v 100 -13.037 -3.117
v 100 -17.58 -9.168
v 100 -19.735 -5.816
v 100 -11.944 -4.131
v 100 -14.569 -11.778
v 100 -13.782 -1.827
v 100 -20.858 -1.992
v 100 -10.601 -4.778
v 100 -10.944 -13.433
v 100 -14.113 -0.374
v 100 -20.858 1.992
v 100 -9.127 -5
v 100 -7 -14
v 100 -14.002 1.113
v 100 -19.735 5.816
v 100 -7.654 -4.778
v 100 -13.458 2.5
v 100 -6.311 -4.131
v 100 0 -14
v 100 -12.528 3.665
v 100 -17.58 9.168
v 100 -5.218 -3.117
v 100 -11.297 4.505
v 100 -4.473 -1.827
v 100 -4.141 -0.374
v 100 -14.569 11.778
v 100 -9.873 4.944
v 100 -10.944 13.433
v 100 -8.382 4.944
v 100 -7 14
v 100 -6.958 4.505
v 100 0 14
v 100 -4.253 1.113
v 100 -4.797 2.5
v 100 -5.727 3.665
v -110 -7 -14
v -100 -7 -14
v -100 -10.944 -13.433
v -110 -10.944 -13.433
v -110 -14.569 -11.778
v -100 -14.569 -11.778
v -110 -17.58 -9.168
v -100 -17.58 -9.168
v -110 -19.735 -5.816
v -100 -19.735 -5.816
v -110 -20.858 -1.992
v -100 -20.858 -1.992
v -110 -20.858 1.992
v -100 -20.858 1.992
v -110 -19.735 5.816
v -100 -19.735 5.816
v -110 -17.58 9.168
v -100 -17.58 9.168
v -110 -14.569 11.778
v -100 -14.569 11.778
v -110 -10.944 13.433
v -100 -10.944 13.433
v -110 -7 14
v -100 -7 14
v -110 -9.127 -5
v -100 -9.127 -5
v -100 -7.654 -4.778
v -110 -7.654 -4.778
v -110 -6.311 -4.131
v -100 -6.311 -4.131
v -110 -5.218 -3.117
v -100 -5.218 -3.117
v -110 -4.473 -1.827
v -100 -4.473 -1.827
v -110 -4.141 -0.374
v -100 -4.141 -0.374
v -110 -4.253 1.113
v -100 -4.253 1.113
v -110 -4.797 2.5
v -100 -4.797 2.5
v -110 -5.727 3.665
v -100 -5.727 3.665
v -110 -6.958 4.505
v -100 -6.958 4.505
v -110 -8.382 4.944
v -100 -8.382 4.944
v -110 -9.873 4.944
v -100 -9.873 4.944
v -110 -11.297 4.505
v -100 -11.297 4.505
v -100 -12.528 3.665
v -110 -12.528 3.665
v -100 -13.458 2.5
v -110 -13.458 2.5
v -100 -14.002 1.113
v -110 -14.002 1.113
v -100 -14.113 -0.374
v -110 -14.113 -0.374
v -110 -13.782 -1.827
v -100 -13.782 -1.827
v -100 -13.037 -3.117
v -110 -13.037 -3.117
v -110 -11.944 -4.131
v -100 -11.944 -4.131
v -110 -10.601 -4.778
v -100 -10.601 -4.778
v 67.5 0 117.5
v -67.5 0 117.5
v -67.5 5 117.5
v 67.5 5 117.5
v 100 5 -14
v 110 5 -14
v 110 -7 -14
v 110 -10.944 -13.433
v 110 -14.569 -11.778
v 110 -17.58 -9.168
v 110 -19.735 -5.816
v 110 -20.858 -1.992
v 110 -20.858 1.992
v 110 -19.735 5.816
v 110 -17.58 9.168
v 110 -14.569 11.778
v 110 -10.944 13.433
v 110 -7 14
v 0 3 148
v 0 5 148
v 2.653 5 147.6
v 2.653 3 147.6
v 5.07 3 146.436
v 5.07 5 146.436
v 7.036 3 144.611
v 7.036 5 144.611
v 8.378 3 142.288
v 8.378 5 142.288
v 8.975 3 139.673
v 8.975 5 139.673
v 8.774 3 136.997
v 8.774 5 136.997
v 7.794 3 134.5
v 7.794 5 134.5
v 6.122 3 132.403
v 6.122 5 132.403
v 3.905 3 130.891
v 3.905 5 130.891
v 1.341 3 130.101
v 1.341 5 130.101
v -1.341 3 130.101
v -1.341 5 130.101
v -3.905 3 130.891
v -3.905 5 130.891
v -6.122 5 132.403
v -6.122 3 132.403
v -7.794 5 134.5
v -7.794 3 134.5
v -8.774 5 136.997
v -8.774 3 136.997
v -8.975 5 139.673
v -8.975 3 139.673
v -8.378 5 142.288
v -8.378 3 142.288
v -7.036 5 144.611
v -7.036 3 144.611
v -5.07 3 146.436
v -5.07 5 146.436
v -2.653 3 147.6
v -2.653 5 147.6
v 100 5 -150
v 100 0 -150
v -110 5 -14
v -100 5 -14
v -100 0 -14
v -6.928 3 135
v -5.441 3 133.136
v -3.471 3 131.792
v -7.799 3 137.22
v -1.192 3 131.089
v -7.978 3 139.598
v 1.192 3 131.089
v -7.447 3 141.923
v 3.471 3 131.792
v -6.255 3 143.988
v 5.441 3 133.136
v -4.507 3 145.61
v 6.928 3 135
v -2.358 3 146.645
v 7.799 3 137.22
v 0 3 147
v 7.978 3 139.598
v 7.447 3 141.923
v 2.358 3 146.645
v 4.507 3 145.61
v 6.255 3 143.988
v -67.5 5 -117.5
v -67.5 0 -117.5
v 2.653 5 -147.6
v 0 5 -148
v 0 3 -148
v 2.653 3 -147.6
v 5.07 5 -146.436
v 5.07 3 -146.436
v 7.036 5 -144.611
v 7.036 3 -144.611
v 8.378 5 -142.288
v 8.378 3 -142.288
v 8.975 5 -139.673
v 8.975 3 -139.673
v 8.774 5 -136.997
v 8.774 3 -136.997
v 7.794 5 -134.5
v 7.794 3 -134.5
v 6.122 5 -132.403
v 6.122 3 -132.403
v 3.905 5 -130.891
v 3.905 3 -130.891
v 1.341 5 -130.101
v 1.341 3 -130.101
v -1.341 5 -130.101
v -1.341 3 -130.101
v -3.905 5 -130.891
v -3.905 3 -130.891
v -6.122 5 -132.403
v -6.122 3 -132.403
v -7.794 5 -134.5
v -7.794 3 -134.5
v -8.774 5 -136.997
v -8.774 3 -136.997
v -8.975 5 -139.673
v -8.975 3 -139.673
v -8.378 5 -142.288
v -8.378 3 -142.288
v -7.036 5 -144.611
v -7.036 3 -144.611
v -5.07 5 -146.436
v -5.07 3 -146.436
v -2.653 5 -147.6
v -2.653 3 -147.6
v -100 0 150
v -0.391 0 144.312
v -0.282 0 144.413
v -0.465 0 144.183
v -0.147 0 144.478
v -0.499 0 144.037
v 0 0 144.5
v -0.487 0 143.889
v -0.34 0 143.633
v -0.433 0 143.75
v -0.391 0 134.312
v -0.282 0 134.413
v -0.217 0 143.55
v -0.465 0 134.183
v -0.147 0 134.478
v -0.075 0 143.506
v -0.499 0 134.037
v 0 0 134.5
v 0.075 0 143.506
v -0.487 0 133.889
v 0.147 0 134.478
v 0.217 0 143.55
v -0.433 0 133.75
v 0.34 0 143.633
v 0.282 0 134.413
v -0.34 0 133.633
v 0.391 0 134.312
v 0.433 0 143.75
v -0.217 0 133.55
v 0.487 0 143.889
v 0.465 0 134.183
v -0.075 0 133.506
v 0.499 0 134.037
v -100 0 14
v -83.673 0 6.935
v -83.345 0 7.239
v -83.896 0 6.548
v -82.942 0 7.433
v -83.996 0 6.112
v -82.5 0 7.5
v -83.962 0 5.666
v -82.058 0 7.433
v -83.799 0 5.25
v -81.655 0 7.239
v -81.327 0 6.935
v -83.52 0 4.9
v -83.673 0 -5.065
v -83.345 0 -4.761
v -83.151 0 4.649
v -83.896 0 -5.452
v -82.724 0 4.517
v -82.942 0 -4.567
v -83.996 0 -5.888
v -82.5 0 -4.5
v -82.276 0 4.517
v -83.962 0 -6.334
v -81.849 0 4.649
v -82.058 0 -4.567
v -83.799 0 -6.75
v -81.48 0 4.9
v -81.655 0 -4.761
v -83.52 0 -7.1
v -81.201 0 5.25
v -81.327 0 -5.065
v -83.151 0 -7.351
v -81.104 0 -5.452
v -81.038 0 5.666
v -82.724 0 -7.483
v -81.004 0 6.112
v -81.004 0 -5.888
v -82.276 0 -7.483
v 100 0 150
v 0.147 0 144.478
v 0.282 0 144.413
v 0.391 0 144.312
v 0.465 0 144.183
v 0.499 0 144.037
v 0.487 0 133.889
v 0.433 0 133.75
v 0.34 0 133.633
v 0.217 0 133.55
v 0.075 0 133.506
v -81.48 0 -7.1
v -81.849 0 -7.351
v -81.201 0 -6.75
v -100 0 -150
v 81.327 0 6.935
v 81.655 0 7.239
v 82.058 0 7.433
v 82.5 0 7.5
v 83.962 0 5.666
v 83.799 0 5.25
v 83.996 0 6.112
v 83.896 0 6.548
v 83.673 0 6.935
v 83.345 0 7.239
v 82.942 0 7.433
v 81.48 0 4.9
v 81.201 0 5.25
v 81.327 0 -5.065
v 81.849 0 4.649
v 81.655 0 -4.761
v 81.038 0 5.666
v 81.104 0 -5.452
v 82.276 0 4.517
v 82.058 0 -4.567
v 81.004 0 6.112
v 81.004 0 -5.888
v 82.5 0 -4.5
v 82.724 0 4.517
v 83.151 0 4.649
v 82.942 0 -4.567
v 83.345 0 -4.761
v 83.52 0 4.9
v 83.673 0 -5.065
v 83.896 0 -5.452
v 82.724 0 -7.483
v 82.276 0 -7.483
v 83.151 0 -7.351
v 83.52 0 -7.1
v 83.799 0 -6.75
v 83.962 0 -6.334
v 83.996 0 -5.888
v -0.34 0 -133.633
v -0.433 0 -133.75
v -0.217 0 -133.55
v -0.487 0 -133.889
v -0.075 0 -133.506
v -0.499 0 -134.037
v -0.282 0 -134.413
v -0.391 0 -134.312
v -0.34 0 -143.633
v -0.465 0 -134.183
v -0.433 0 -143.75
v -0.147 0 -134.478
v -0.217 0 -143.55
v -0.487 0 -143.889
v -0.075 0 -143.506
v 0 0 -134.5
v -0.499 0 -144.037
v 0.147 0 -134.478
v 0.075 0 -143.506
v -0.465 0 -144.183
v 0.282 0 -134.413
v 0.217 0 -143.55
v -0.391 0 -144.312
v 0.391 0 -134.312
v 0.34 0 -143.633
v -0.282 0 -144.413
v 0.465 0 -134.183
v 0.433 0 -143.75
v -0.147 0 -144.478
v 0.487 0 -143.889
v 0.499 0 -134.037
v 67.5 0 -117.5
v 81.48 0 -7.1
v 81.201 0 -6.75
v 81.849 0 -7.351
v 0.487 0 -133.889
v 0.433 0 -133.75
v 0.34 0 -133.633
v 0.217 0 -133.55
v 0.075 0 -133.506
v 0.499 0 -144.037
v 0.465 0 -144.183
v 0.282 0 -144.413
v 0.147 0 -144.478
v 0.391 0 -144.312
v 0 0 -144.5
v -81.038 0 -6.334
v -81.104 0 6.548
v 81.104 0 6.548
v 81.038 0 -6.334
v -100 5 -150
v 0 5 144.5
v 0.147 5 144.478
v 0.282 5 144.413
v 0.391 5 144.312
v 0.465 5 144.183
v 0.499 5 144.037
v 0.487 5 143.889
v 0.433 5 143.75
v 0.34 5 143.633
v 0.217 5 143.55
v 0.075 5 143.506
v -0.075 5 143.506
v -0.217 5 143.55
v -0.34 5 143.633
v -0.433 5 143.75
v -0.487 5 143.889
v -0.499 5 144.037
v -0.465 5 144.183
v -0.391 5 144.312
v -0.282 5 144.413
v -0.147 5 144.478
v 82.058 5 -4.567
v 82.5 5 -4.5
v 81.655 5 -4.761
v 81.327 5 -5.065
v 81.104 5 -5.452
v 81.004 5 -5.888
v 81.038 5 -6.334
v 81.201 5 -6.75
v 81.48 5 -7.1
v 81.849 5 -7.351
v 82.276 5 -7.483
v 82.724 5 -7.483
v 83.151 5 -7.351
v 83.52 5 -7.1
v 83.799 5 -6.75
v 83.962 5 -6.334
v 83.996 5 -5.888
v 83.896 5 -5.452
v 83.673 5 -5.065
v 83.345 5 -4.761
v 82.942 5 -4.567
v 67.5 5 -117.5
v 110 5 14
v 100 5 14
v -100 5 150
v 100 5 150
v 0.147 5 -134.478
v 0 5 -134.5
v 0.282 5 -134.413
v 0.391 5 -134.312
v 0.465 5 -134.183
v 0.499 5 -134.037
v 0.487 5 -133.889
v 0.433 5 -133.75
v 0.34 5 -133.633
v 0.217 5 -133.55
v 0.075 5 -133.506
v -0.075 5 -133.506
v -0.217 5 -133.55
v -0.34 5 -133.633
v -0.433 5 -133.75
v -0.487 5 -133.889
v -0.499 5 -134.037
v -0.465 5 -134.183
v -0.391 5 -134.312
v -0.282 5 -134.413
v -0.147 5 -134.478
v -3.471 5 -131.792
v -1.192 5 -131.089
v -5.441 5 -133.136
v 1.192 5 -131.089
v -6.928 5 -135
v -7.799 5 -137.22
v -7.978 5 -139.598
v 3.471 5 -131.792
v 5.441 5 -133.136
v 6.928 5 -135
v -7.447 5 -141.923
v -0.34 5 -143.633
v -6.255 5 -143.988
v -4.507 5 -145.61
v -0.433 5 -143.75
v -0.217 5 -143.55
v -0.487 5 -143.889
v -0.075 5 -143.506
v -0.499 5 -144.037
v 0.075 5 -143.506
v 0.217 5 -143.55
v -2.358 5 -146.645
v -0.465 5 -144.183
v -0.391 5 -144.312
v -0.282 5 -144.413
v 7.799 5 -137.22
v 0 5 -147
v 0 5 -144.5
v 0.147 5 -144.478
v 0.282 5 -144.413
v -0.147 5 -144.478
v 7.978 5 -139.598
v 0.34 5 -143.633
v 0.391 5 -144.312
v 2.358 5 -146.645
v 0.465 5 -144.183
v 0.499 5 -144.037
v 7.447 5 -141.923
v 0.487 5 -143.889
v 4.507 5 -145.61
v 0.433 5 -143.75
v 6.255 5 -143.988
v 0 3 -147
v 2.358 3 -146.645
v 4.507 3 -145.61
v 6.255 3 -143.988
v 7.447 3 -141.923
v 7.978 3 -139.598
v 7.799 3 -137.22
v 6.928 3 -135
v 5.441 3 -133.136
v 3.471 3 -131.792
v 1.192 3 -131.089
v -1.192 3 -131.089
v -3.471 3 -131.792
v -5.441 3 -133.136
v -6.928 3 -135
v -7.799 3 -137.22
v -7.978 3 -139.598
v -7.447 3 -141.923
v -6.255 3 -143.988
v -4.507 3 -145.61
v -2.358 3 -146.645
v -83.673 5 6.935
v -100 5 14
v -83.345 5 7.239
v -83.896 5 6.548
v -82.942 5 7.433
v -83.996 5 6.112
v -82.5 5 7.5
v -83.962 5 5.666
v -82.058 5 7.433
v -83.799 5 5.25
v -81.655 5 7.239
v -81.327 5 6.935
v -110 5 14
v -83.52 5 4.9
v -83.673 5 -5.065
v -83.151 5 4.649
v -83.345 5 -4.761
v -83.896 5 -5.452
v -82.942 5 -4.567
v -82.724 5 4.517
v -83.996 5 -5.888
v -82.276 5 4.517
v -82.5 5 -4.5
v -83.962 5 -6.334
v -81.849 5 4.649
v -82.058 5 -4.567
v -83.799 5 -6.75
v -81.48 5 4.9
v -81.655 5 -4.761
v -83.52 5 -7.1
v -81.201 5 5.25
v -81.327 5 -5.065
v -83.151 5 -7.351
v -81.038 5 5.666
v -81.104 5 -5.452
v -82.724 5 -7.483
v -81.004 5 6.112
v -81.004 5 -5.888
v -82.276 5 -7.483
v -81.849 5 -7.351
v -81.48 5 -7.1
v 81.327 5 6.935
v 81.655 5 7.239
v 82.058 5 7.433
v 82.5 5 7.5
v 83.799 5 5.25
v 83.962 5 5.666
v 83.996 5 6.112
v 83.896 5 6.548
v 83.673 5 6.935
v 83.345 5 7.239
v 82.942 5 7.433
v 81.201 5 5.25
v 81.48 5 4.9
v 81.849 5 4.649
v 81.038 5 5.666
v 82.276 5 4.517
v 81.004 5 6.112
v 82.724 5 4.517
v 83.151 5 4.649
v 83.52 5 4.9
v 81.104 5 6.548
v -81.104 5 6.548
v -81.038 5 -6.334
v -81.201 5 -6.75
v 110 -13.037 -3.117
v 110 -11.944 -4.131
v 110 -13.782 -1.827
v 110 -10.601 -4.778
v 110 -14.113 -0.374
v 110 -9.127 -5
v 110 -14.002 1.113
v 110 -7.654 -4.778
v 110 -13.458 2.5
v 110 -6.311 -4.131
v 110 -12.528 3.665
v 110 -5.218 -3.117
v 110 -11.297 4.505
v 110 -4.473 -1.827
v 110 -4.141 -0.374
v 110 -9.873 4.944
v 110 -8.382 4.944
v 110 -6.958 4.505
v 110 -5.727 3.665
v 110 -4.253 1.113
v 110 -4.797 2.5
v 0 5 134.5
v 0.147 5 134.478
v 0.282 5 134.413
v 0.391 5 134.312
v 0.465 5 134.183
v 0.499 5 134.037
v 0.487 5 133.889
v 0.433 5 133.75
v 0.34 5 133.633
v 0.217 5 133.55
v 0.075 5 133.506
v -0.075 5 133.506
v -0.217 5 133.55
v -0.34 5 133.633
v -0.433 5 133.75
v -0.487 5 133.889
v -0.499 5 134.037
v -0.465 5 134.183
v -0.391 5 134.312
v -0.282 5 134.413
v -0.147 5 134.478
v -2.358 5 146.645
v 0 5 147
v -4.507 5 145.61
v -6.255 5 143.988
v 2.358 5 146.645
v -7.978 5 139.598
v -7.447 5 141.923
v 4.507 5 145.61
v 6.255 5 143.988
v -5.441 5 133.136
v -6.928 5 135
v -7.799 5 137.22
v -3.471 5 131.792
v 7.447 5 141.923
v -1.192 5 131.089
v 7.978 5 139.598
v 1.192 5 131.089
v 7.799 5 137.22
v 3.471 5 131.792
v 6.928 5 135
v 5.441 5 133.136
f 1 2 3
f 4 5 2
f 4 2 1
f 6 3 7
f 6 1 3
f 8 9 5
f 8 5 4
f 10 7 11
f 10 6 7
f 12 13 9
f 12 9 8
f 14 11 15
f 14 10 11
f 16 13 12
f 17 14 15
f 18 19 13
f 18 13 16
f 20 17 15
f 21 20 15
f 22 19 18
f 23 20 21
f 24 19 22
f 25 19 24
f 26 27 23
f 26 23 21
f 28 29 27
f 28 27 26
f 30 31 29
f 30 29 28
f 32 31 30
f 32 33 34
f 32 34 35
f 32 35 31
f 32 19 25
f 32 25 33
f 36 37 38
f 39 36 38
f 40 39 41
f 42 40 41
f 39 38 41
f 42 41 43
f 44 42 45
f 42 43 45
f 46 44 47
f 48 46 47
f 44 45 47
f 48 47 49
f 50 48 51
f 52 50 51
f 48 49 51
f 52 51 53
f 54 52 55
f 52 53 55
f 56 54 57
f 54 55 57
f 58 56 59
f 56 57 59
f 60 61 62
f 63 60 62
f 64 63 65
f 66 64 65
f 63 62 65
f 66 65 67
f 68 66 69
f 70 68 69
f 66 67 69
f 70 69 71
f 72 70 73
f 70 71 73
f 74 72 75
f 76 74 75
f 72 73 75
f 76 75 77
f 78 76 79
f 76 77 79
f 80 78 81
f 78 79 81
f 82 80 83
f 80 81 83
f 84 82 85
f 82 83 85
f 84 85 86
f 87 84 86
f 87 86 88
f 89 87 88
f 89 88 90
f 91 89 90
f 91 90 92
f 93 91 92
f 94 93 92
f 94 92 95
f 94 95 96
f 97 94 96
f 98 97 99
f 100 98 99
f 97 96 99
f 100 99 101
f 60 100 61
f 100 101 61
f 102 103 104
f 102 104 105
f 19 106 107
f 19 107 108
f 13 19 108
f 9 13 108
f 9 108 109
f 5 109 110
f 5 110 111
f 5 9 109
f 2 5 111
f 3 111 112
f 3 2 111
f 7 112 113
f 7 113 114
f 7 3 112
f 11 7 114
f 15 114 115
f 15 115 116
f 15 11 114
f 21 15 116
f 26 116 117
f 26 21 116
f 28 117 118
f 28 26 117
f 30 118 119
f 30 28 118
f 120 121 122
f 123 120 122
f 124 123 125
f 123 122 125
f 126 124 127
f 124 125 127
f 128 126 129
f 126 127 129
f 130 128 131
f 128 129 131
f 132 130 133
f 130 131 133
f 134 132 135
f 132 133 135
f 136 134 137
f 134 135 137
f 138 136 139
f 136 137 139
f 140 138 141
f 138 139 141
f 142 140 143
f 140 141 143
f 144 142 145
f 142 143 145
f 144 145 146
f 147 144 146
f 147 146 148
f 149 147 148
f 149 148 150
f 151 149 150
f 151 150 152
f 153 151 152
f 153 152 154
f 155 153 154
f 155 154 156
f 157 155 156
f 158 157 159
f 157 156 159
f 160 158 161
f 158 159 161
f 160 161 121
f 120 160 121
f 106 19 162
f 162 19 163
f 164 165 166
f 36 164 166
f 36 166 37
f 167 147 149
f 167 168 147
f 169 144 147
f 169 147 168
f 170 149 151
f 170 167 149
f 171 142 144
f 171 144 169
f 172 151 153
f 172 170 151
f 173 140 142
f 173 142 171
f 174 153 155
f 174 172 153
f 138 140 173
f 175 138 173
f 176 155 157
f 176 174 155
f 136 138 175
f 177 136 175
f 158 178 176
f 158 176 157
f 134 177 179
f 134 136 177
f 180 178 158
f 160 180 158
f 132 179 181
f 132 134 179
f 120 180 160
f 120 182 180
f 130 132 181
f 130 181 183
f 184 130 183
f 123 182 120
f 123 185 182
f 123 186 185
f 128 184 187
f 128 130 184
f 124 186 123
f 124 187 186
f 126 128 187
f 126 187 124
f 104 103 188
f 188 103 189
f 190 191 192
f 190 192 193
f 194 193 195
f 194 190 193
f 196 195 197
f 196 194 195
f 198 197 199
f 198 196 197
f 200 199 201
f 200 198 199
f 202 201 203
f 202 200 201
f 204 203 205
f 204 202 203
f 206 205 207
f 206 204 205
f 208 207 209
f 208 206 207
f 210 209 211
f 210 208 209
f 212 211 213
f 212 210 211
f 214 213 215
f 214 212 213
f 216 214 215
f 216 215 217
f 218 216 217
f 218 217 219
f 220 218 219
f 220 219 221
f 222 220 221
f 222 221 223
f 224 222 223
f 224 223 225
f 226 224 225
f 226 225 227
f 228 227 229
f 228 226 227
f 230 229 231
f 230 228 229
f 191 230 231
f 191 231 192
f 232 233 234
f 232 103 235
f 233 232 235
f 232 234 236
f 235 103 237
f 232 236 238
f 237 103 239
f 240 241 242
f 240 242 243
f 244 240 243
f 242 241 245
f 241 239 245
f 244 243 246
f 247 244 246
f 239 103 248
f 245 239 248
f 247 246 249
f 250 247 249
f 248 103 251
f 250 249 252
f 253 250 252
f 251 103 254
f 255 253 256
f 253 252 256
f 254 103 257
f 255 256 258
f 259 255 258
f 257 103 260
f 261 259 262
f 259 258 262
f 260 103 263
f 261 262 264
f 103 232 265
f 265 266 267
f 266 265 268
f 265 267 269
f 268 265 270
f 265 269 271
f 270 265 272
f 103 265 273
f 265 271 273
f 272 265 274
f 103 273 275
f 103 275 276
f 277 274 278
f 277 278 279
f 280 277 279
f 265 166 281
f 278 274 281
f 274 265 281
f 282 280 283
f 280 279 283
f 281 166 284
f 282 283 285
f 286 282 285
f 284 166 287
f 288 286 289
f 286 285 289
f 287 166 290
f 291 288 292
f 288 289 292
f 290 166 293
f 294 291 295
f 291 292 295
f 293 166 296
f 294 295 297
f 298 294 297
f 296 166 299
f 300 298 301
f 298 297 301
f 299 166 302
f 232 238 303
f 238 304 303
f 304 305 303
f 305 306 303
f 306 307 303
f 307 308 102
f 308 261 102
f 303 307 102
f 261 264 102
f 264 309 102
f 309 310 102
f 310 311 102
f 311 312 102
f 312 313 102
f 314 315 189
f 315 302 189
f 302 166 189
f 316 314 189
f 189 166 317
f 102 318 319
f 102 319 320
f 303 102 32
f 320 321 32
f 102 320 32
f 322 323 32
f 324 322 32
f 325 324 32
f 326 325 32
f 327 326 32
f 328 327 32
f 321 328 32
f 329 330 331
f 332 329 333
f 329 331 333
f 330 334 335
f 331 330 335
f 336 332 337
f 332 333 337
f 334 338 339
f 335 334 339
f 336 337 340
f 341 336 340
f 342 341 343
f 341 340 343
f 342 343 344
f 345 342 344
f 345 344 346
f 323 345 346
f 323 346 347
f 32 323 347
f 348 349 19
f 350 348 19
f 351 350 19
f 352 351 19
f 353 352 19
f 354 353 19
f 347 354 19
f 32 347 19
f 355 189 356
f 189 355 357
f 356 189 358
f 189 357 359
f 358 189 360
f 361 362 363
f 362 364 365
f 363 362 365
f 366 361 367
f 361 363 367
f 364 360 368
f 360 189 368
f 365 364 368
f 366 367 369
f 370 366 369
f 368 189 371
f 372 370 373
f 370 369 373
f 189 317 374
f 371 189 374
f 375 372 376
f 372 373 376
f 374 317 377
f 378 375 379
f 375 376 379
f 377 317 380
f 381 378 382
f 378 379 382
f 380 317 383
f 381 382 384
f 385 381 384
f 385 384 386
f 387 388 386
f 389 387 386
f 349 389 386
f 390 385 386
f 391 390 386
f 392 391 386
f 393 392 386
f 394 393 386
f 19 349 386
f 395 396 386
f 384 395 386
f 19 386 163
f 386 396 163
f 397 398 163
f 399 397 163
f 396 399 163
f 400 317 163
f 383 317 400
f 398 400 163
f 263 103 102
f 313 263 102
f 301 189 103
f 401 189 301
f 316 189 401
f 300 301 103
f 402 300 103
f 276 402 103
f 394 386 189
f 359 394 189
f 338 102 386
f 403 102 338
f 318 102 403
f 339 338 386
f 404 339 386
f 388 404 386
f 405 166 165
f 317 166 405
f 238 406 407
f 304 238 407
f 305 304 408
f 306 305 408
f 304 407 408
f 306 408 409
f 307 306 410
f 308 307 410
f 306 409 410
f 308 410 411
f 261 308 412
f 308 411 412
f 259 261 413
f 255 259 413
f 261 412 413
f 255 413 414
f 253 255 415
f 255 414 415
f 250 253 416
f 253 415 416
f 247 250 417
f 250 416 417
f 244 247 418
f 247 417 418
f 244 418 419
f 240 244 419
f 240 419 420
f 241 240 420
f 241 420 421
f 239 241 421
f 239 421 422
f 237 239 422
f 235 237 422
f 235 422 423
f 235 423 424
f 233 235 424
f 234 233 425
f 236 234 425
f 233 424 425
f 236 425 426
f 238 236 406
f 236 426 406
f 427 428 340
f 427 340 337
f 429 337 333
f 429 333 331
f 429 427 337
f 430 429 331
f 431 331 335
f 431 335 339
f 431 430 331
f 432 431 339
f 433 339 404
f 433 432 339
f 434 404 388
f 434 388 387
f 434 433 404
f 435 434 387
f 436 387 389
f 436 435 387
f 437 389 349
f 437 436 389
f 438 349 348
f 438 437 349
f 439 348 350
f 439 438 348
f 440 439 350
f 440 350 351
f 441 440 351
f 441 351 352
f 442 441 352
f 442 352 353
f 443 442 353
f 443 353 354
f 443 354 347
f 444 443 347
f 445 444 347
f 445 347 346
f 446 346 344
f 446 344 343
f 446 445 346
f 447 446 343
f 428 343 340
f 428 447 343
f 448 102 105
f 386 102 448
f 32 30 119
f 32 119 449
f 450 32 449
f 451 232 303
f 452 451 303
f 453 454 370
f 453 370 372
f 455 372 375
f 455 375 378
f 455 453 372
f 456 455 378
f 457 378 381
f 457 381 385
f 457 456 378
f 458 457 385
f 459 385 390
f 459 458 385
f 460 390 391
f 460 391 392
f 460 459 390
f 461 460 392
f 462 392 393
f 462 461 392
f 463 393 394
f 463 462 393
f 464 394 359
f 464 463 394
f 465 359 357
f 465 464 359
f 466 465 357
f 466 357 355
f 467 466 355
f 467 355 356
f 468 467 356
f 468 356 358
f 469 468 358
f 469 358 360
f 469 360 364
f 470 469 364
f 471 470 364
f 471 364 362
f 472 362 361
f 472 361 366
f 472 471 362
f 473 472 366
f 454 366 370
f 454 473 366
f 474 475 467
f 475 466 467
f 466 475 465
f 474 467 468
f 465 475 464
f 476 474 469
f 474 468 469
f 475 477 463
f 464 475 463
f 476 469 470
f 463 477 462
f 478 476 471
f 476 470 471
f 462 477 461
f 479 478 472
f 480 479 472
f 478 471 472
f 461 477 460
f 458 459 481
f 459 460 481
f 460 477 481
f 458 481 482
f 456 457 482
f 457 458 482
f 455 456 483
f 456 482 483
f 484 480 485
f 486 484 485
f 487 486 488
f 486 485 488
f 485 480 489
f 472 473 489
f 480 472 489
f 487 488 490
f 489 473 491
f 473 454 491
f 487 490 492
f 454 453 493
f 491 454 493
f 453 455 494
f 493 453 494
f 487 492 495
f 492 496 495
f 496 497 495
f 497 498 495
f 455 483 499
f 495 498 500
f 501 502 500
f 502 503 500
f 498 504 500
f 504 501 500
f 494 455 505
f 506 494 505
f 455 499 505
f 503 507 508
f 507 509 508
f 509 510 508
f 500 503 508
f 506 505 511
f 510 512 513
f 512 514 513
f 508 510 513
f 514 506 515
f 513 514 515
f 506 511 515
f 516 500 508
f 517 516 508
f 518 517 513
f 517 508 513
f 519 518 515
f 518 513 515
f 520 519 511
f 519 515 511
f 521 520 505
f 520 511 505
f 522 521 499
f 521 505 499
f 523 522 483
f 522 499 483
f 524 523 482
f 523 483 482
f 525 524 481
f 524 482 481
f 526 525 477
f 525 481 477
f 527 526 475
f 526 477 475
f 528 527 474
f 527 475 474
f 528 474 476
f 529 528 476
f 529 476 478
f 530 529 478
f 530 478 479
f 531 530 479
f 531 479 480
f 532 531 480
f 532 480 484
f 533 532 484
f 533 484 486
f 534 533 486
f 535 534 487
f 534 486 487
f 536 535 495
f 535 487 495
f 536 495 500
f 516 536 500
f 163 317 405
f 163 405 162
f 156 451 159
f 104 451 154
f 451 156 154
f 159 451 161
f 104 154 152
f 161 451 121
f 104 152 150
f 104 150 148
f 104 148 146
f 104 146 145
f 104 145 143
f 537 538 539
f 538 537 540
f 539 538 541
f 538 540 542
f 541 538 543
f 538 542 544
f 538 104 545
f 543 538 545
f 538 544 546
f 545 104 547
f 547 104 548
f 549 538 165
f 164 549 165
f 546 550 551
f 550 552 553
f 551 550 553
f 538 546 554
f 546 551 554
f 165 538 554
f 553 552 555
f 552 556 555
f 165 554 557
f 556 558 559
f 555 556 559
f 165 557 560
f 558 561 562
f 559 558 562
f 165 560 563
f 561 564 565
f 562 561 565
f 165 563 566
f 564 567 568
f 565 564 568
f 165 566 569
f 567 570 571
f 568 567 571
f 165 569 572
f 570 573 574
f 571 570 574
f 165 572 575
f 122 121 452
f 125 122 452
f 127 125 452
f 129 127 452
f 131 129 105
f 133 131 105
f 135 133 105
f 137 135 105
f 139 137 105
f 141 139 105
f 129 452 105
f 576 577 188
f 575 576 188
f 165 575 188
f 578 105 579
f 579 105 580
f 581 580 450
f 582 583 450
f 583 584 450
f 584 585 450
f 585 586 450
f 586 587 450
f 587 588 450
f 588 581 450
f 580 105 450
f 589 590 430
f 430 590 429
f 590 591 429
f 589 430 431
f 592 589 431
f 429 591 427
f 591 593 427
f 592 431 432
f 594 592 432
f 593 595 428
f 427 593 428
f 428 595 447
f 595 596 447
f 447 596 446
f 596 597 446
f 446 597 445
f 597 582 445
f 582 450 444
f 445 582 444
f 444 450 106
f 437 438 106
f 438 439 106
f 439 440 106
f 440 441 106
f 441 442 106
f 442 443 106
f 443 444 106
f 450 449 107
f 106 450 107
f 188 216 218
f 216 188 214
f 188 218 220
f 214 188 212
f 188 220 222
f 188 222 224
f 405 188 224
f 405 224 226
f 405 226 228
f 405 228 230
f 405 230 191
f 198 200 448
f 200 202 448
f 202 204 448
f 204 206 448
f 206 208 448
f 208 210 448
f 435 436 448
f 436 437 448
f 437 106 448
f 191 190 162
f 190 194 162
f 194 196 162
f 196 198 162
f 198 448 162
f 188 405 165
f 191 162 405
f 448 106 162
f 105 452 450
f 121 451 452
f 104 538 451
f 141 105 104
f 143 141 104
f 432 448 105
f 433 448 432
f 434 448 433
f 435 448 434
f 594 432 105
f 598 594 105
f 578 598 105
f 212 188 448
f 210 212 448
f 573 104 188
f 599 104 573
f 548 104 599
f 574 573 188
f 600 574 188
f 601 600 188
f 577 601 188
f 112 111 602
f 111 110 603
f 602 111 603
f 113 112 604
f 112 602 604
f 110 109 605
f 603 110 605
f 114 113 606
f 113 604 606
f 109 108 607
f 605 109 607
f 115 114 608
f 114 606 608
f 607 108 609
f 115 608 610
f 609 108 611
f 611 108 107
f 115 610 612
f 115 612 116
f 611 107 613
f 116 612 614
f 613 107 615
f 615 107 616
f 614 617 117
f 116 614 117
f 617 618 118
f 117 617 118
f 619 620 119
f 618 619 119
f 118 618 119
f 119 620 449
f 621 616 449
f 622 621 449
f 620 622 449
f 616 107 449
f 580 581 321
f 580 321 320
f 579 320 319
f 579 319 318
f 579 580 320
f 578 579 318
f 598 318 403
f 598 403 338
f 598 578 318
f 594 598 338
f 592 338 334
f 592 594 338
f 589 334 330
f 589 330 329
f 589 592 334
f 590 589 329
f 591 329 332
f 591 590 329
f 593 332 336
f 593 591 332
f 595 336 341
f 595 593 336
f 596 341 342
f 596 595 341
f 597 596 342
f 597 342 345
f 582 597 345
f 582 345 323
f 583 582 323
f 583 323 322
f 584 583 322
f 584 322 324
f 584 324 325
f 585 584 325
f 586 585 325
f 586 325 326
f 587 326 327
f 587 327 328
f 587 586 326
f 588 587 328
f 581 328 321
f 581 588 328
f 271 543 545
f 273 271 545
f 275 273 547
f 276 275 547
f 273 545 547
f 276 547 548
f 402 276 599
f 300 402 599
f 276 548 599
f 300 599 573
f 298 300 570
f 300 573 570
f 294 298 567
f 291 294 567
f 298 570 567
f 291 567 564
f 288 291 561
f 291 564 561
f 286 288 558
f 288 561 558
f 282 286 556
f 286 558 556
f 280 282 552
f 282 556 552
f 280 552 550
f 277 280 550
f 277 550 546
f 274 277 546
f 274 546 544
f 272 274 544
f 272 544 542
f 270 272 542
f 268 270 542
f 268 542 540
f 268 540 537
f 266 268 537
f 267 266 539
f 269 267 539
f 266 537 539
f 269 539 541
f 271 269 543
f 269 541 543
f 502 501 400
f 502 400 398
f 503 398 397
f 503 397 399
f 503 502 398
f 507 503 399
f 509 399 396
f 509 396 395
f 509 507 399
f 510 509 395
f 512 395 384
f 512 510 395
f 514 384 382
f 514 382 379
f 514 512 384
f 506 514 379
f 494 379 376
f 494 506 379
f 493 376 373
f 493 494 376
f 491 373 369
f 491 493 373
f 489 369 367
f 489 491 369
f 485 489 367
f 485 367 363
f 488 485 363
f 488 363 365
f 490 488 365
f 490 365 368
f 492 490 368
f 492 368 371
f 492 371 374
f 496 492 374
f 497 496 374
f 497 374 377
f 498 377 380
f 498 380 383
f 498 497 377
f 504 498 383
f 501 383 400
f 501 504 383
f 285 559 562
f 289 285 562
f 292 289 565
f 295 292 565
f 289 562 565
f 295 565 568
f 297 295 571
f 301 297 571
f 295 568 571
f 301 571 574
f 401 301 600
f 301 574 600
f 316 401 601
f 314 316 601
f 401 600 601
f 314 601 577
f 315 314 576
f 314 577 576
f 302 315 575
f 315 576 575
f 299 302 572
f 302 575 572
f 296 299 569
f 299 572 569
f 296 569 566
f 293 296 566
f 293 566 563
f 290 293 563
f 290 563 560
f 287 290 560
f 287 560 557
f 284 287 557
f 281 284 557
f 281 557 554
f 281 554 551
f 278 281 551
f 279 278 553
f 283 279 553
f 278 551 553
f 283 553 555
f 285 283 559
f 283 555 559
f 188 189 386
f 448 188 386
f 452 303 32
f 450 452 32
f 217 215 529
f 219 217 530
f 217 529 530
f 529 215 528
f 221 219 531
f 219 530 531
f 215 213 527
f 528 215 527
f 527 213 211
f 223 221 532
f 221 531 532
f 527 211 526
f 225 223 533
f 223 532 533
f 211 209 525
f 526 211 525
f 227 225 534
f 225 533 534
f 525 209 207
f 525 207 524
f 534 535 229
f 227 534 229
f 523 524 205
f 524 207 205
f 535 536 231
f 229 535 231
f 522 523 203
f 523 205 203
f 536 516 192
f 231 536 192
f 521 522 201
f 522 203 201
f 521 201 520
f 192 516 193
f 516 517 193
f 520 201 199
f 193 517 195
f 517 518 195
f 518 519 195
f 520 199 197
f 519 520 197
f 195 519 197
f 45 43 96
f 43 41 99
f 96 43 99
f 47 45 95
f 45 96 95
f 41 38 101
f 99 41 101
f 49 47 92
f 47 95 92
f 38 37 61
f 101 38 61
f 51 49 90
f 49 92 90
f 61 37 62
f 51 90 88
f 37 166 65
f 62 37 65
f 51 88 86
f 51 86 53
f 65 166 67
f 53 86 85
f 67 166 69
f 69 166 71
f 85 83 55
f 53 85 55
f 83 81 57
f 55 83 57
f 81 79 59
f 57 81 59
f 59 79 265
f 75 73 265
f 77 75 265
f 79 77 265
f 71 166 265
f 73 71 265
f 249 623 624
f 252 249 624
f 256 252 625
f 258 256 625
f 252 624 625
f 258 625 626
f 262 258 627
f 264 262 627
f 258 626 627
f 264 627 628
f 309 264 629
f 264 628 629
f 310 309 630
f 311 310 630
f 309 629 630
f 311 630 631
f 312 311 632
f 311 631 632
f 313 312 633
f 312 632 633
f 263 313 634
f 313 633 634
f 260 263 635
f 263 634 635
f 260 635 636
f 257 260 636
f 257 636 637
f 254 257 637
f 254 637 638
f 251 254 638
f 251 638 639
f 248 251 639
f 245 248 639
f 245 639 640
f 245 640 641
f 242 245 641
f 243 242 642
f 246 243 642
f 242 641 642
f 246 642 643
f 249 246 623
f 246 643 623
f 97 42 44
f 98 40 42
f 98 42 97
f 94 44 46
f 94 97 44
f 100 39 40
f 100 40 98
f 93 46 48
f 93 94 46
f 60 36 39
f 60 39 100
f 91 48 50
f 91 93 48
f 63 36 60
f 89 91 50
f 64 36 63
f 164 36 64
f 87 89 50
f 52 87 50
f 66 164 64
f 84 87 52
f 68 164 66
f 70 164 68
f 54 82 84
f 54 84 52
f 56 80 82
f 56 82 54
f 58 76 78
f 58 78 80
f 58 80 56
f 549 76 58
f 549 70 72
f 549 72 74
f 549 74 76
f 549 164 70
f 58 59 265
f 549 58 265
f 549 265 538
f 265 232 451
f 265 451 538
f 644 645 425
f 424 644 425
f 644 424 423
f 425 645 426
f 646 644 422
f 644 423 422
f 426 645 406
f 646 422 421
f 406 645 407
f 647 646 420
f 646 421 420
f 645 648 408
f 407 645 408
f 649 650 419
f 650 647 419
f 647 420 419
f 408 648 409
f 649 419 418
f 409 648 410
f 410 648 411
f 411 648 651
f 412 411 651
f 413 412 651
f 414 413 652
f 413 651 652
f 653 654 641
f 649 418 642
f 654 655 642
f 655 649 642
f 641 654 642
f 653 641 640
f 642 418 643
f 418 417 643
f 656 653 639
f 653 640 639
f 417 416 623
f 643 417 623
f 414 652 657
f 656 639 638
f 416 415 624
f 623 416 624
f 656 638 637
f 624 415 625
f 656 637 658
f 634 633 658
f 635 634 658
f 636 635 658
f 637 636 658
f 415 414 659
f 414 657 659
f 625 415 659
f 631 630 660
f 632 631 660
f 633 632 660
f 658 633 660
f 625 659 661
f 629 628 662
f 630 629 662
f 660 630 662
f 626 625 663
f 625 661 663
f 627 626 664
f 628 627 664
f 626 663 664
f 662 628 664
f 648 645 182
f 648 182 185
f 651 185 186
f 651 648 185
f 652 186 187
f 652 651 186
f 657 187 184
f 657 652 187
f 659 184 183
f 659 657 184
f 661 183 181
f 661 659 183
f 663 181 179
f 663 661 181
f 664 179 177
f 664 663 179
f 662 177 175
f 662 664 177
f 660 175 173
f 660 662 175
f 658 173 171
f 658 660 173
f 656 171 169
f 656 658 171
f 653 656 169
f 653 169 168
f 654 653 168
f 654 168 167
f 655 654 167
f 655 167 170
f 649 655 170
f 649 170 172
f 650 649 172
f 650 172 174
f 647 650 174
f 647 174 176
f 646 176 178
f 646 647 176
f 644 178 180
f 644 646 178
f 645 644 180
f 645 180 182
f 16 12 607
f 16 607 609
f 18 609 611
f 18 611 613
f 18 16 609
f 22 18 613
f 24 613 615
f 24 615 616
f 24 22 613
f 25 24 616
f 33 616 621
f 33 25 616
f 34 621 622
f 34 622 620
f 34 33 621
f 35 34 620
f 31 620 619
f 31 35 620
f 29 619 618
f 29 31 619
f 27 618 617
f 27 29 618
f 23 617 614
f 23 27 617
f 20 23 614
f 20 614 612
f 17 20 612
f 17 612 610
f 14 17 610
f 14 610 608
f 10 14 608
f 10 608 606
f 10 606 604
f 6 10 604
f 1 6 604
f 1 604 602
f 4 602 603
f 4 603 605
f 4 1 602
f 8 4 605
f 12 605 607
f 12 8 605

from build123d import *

# Parameters (mm, degrees)
SKETCH1_W           = 200
SKETCH1_H           = 300
SKETCH1_W_2         = 135
SKETCH1_H_2         = 235
BOSS_EXTRUDE1_DEPTH = 5
SKETCH3_R           = 5
BOSS_EXTRUDE2_DEPTH = 10
SKETCH4_R           = 9
SKETCH4_R_2         = 8
CUT_EXTRUDE1_DEPTH  = 2
SKETCH5_R           = 0.5
CUT_EXTRUDE2_DEPTH  = 5
SKETCH6_R           = 1.5
CUT_EXTRUDE3_DEPTH  = 5


with BuildPart() as part:
    # Sketch1 → Boss-Extrude1 (new body)
    with BuildSketch(Plane(origin=(0, 0, 0), x_dir=(1, 0, 0), z_dir=(0, 1, 0))):
        Rectangle(SKETCH1_W, SKETCH1_H)
        Rectangle(SKETCH1_W_2, SKETCH1_H_2, mode=Mode.SUBTRACT)
    extrude(amount=BOSS_EXTRUDE1_DEPTH)

    # Sketch3 → Boss-Extrude2 (add)
    with BuildSketch(Plane(origin=(100, 0, 0), x_dir=(0, 0, -1), z_dir=(1, 0, 0))):
        with BuildLine():
            Line((-14, 5), (14, 5))
            Line((14, 5), (14, -7))
            ThreePointArc((14, -7), (0, -21.000001209), (-14, -7))
            Line((-14, -7), (-14, 5))
        make_face()
        with Locations((0, -9.127388195)):
            Circle(SKETCH3_R, mode=Mode.SUBTRACT)
    boss_extrude2 = extrude(amount=BOSS_EXTRUDE2_DEPTH)

    # Mirror1: Boss-Extrude2 across plane
    add(boss_extrude2.mirror(Plane(origin=(0, 0, 0), x_dir=(0, 0, 1), z_dir=(1, 0, 0))))

    # Sketch4 → Cut-Extrude1 (cut)
    with BuildSketch(Plane(origin=(0, 5, 0), x_dir=(1, 0, 0), z_dir=(0, 1, 0))):
        with Locations(Location((0, -139, 0), (0, 0, 270))):
            Circle(SKETCH4_R)
        with Locations(Location((0, -139, 0), (0, 0, 270))):
            Circle(SKETCH4_R_2, mode=Mode.SUBTRACT)
    cut_extrude1 = extrude(amount=-CUT_EXTRUDE1_DEPTH, mode=Mode.SUBTRACT)

    # Mirror2: Cut-Extrude1 across plane
    add(cut_extrude1.mirror(Plane.XY), mode=Mode.SUBTRACT)

    # Sketch5 → Cut-Extrude2 (cut)
    with BuildSketch(Plane(origin=(0, 5, 0), x_dir=(1, 0, 0), z_dir=(0, 1, 0))):
        with Locations(Location((0, -134, 0), (0, 0, 270))):
            Circle(SKETCH5_R)
        with Locations(Location((0, -144, 0), (0, 0, 270))):
            Circle(SKETCH5_R)
    cut_extrude2 = extrude(amount=-CUT_EXTRUDE2_DEPTH, mode=Mode.SUBTRACT)

    # Mirror3: Cut-Extrude2 across plane
    add(cut_extrude2.mirror(Plane.XY), mode=Mode.SUBTRACT)

    # Sketch6 → Cut-Extrude3 (cut)
    with BuildSketch(Plane(origin=(0, 5, 0), x_dir=(1, 0, 0), z_dir=(0, 1, 0))):
        with Locations(Location((-82.5, 6, 0), (0, 0, 270))):
            Circle(SKETCH6_R)
        with Locations(Location((-82.5, -6, 0), (0, 0, 270))):
            Circle(SKETCH6_R)
    cut_extrude3 = extrude(amount=-CUT_EXTRUDE3_DEPTH, mode=Mode.SUBTRACT)

    # Mirror4: Cut-Extrude3 across plane
    add(cut_extrude3.mirror(Plane(origin=(0, 0, 0), x_dir=(0, 0, 1), z_dir=(1, 0, 0))), mode=Mode.SUBTRACT)


solid = part.part
